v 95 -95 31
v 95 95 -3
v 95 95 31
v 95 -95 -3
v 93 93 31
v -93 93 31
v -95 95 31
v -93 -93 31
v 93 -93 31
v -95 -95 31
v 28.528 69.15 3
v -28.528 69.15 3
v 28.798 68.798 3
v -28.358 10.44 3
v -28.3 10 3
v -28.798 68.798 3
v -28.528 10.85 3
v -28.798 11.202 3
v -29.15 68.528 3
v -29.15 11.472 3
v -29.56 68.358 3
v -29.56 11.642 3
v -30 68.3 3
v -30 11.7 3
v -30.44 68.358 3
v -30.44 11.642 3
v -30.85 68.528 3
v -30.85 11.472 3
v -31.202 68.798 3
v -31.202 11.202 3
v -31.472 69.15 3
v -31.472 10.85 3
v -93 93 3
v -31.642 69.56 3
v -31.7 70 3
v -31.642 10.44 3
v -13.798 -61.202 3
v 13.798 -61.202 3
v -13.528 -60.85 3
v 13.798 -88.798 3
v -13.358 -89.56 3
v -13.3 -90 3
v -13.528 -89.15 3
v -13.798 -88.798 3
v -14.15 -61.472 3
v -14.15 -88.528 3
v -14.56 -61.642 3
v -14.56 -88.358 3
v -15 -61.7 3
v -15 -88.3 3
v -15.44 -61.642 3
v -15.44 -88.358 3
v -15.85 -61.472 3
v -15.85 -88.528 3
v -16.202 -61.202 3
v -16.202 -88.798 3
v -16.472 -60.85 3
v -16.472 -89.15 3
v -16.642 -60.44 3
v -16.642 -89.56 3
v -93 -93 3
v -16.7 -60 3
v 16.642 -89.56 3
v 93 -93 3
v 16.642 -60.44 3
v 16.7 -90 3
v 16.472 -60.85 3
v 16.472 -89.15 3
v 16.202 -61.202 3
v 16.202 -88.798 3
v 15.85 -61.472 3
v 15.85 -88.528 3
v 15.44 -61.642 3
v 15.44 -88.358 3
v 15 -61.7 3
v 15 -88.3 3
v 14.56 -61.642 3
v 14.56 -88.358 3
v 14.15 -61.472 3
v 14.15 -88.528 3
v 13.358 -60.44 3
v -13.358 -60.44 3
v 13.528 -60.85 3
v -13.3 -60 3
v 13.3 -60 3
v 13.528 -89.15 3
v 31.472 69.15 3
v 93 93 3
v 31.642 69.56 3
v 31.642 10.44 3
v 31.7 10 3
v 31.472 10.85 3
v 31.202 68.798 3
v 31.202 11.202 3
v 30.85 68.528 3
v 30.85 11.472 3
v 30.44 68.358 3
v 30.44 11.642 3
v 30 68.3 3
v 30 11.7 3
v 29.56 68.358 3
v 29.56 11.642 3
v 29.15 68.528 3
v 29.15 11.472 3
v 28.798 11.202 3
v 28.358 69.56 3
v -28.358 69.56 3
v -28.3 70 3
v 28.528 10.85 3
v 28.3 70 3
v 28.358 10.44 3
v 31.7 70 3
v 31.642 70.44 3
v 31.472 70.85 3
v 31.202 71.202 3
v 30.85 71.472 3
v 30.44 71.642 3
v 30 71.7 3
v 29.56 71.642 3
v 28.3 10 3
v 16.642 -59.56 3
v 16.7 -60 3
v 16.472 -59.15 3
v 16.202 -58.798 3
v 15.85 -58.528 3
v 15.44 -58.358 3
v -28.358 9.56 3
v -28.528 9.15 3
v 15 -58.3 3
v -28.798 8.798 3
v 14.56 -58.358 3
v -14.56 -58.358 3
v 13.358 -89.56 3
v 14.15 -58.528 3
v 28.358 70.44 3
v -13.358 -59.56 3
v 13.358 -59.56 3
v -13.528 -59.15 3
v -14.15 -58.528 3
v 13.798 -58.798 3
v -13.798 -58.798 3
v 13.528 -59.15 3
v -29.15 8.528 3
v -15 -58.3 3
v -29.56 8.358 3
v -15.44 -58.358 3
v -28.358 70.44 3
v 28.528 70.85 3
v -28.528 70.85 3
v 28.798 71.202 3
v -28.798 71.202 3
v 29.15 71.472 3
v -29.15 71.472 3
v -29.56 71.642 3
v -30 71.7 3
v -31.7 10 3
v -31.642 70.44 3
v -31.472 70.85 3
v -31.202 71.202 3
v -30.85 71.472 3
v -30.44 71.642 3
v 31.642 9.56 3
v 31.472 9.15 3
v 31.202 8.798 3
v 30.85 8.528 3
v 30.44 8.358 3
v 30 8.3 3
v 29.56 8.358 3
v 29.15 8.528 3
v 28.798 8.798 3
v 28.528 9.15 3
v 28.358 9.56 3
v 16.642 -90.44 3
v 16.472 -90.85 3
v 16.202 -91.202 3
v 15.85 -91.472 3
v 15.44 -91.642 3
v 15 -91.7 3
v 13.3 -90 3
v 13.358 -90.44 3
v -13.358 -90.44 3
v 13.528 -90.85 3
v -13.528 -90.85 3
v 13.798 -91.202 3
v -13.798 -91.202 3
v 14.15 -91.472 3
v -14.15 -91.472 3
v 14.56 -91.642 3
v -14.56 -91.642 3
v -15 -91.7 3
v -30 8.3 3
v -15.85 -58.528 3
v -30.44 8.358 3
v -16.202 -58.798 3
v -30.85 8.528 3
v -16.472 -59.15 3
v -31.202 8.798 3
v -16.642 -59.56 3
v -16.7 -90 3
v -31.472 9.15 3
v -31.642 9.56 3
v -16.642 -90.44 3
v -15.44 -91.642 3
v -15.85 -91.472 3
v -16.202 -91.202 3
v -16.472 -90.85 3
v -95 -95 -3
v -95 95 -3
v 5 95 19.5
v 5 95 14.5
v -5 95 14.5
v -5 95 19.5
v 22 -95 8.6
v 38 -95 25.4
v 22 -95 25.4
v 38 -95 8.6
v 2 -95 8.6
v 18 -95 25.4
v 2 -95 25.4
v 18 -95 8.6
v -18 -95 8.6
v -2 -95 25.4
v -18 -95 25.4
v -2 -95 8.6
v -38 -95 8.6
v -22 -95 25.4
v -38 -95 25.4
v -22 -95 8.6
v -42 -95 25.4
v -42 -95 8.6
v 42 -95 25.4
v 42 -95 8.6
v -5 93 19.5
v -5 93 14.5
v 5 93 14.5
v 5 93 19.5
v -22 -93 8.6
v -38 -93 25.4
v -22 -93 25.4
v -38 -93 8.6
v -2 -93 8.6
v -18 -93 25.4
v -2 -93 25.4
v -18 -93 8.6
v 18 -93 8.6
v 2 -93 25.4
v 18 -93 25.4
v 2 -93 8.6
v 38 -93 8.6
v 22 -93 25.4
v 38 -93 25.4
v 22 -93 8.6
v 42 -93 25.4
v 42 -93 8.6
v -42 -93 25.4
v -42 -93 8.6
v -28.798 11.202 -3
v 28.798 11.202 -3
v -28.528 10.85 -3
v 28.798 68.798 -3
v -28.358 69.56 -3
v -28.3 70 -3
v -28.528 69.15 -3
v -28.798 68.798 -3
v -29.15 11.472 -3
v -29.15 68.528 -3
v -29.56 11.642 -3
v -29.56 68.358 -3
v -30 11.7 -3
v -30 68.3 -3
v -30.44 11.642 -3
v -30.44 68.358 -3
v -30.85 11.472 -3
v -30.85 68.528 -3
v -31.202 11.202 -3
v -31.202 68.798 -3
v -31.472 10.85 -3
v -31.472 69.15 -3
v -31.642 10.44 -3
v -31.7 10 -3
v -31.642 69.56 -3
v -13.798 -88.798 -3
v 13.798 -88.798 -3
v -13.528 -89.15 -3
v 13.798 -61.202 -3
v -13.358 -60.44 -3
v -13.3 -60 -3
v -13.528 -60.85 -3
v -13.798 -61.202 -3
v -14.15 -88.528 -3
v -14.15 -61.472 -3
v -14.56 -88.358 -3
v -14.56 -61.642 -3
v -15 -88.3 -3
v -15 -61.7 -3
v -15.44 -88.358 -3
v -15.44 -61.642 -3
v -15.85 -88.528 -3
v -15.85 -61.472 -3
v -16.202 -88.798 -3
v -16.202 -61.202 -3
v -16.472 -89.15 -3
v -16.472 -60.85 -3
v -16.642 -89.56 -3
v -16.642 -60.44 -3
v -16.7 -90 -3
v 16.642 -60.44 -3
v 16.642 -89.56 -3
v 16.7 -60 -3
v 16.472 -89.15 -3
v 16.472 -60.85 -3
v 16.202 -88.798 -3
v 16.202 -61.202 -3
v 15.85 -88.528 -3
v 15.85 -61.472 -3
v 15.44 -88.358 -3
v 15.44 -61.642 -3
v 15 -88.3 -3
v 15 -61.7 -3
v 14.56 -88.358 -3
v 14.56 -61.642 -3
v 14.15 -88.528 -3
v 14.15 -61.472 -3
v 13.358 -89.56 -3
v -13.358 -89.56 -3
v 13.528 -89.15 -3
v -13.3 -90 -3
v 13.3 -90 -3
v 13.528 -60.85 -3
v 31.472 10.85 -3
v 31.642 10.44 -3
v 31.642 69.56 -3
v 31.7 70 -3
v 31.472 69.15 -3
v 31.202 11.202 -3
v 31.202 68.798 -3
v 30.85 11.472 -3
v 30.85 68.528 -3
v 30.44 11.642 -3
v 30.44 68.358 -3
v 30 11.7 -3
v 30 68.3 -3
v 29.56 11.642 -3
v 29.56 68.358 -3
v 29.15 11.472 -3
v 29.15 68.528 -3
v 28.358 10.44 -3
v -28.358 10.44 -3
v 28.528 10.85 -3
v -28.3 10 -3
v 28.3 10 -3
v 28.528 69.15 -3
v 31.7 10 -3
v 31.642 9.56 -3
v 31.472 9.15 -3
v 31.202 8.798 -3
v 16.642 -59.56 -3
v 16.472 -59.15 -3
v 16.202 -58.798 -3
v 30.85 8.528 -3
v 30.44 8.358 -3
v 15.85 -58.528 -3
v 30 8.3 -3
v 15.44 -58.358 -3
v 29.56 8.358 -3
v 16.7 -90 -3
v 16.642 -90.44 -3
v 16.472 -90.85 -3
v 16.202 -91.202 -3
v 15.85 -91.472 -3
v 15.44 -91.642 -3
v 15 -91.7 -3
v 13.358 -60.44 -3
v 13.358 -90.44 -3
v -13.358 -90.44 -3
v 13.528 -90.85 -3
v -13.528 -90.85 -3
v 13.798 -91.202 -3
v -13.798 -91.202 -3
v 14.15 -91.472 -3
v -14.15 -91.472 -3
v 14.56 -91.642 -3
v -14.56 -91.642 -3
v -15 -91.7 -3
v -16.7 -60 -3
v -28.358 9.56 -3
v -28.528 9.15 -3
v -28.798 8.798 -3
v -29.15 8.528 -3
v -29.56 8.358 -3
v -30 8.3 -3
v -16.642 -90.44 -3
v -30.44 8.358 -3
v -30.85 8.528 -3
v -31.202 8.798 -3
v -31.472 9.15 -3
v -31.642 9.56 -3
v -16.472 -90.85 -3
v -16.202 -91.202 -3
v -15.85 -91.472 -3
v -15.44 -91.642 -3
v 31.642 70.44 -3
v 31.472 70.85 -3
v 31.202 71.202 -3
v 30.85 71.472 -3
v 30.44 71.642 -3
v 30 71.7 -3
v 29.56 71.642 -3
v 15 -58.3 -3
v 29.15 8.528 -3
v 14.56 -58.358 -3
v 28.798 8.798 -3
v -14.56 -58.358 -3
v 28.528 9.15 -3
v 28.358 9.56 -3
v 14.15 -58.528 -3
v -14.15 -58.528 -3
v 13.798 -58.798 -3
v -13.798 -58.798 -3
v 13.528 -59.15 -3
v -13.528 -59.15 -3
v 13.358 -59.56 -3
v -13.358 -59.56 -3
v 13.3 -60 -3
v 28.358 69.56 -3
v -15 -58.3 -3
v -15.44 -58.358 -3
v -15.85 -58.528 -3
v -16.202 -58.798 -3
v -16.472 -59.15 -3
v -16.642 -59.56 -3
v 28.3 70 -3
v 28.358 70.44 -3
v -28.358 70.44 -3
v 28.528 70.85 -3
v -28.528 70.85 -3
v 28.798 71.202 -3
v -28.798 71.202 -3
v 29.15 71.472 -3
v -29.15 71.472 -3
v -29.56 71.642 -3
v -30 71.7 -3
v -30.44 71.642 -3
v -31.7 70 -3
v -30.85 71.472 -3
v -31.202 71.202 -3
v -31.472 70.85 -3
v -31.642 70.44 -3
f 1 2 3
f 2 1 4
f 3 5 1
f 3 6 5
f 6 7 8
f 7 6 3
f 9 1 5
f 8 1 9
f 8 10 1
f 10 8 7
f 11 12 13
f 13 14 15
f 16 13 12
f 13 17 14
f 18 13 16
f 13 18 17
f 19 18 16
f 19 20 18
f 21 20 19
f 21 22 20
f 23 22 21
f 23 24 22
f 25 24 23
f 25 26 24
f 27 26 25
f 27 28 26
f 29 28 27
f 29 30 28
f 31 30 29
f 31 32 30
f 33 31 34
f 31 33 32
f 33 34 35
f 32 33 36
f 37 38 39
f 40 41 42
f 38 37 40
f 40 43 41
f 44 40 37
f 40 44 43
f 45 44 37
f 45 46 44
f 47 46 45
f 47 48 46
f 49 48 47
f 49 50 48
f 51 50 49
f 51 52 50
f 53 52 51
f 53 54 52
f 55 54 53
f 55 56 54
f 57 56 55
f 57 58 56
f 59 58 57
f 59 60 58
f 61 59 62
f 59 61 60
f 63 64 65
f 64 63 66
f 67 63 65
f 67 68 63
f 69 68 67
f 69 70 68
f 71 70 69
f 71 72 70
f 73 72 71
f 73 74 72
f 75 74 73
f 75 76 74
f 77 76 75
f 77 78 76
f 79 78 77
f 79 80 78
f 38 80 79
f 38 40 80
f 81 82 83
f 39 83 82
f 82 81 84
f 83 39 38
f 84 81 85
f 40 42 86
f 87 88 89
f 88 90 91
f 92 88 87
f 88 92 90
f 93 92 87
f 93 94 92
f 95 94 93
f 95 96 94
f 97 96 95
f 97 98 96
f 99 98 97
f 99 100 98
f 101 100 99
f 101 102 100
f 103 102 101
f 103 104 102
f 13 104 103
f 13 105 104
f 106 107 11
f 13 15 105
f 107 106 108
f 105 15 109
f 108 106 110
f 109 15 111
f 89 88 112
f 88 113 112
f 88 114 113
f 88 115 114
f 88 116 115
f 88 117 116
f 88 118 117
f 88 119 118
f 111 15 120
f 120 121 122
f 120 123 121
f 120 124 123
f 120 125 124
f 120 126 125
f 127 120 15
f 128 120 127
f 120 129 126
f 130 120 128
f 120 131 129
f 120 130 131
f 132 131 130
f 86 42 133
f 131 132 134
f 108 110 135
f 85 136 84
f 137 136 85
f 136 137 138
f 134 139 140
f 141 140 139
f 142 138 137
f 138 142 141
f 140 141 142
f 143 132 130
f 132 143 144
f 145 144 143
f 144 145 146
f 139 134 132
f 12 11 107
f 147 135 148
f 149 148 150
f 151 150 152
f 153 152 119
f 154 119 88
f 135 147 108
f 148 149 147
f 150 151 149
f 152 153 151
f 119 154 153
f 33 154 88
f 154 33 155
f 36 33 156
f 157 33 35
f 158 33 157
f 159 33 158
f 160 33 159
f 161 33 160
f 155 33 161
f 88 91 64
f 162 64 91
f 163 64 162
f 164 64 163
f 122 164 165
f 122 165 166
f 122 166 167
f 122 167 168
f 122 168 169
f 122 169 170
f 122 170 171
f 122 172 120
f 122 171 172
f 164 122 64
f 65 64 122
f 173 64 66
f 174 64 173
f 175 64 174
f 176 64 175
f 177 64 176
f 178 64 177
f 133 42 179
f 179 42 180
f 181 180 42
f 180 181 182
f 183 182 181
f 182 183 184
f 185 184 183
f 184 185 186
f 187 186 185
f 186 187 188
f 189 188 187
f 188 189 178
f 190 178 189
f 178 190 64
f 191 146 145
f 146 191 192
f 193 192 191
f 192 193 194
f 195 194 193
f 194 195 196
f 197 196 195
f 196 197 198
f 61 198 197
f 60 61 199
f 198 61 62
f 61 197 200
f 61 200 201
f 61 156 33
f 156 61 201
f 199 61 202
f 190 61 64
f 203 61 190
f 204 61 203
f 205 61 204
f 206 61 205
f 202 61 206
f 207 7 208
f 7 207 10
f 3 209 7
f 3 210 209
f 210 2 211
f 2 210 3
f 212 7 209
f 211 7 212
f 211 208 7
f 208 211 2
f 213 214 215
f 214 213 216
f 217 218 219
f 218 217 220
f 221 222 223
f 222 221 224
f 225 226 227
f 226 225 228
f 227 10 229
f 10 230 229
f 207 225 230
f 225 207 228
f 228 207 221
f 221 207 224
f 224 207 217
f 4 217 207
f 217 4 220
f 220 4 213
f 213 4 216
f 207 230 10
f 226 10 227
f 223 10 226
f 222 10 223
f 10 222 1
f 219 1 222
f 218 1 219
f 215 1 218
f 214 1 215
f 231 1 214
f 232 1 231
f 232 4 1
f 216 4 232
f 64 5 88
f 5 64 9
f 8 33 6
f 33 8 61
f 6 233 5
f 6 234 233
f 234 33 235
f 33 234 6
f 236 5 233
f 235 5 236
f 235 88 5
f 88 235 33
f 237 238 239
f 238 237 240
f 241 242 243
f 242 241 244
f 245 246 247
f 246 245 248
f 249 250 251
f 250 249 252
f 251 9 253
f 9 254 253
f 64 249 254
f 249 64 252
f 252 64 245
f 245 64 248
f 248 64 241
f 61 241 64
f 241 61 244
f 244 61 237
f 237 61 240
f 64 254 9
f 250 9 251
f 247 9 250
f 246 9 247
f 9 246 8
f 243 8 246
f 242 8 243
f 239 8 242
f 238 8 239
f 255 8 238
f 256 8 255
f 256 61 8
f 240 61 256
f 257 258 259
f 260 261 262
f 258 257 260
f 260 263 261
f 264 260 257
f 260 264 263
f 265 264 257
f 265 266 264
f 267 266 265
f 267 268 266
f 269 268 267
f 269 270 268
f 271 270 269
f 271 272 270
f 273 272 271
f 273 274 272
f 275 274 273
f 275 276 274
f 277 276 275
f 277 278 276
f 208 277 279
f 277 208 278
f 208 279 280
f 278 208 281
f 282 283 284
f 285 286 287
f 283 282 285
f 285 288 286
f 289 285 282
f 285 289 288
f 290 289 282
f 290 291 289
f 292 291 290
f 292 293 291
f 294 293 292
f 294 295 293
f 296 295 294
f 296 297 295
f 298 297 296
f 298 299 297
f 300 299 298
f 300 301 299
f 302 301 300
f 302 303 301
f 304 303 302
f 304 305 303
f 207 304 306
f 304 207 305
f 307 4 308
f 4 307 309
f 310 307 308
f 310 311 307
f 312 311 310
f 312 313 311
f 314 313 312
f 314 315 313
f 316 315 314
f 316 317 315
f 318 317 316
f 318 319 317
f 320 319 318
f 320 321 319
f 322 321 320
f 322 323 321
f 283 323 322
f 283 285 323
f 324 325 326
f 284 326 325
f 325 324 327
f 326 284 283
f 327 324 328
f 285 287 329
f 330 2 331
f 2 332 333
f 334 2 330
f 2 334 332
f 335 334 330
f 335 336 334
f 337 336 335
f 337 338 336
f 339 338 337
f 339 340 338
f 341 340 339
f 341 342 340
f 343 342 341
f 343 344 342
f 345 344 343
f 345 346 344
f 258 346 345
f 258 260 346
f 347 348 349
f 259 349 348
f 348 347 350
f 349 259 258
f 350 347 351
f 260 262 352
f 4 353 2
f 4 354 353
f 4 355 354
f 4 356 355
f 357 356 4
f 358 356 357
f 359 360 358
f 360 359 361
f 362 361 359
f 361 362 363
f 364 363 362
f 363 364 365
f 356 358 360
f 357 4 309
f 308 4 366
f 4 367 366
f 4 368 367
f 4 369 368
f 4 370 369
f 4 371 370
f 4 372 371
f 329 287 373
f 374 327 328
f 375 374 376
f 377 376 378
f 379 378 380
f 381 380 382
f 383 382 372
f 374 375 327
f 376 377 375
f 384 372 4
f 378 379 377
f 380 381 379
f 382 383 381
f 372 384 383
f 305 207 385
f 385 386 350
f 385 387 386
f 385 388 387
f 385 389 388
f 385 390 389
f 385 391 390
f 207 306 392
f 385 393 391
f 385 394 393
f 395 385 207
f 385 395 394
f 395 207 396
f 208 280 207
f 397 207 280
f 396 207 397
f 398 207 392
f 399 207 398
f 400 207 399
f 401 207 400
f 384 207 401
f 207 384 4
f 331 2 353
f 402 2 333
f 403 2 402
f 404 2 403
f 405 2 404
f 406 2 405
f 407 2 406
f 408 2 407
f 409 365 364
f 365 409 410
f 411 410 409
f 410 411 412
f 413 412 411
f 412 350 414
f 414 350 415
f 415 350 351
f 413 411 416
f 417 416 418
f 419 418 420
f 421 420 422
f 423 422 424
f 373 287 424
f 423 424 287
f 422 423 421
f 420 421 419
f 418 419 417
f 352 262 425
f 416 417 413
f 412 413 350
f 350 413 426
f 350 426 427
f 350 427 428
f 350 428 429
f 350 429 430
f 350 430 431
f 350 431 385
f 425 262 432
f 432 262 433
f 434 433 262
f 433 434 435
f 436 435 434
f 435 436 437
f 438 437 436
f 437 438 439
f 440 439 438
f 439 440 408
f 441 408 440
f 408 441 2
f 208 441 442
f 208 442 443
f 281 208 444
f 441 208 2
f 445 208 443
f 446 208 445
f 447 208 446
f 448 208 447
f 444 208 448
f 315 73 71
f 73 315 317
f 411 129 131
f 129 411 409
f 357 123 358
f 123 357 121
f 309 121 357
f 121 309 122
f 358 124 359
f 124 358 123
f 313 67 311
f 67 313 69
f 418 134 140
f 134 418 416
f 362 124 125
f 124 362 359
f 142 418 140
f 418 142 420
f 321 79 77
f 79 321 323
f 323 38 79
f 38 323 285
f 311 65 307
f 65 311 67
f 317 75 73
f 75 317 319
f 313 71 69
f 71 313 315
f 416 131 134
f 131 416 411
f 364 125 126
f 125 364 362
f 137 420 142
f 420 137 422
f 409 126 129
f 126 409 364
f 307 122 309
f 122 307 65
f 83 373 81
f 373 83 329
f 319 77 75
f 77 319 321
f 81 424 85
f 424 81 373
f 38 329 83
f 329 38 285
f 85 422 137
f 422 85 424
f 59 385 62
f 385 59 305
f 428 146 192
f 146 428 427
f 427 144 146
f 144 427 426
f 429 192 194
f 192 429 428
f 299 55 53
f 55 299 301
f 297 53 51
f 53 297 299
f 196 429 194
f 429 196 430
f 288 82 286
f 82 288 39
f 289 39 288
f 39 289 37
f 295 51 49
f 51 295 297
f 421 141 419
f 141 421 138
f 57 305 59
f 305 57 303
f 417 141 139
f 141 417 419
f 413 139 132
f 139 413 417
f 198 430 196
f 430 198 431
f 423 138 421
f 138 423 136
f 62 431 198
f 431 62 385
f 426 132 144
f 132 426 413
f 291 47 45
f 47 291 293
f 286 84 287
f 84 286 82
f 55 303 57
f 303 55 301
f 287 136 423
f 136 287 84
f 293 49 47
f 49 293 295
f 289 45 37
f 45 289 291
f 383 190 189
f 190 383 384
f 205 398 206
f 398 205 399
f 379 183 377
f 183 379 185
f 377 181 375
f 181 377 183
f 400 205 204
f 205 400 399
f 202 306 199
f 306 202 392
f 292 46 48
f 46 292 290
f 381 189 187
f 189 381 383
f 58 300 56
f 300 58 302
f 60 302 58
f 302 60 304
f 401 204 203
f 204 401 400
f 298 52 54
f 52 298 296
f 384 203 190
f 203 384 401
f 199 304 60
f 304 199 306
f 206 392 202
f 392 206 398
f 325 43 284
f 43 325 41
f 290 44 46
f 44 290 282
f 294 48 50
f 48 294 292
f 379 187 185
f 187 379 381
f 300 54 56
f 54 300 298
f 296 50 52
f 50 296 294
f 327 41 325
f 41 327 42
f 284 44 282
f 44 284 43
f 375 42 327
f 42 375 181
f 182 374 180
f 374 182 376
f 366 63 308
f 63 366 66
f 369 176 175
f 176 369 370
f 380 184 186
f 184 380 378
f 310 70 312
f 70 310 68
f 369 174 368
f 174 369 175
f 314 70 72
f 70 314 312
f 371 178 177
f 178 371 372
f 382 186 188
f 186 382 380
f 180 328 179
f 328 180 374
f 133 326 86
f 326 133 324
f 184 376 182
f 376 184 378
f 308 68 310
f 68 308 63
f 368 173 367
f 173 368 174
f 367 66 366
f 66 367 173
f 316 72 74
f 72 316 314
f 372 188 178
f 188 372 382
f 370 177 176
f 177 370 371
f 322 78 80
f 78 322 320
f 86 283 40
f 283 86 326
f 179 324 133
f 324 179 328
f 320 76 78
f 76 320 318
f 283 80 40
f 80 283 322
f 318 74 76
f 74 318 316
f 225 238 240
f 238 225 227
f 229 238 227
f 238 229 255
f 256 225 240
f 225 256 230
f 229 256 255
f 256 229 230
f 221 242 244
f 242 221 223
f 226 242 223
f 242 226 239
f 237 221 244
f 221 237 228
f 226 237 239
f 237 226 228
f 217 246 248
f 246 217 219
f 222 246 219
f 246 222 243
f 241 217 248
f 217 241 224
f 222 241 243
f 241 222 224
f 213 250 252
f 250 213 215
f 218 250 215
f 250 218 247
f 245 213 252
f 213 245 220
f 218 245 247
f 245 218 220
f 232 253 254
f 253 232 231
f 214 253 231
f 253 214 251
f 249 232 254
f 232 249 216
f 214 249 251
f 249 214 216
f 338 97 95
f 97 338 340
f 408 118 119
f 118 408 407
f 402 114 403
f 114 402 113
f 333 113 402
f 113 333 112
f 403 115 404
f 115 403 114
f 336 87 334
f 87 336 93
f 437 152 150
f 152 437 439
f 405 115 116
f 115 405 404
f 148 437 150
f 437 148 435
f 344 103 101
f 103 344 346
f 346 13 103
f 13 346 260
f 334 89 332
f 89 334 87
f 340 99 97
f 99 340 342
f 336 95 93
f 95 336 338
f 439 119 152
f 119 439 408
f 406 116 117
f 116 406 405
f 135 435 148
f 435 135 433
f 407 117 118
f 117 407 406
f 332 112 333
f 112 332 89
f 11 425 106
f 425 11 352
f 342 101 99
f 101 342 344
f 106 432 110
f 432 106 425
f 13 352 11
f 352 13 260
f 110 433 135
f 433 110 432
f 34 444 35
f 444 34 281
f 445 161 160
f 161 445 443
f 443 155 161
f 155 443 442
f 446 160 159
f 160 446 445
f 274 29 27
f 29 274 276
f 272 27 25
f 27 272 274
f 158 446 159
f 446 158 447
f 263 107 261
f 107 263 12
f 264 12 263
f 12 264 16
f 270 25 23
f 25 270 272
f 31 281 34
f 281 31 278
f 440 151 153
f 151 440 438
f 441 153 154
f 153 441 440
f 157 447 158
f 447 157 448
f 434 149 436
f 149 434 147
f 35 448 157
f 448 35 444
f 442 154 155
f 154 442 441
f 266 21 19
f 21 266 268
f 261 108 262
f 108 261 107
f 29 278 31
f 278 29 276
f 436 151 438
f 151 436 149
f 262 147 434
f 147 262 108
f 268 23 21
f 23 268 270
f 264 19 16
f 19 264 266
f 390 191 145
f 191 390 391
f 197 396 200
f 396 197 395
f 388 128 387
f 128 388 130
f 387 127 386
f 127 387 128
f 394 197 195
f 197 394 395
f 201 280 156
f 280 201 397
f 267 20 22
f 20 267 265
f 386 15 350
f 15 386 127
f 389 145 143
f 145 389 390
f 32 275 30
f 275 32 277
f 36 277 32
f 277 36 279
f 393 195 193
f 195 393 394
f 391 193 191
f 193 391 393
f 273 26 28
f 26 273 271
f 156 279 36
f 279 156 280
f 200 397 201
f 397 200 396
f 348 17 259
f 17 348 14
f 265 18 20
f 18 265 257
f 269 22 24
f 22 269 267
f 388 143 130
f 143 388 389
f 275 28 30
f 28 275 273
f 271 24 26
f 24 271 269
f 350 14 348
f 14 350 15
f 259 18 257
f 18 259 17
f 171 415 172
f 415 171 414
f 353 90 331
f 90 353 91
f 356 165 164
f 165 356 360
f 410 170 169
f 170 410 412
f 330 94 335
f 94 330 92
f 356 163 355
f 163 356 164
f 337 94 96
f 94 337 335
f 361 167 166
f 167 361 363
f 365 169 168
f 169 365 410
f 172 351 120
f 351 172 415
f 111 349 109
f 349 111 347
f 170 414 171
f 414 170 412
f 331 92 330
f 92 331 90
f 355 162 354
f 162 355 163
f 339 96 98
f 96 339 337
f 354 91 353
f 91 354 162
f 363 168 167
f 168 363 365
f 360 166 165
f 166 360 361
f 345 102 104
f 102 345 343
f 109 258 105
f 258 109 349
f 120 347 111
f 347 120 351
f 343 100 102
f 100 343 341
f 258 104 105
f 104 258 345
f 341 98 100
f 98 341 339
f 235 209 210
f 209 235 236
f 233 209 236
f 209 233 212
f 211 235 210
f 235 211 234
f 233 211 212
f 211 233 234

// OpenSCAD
// file: common.scad
// common.scad — every dimension in the feeder lives here.
// Change a value, re-run ../check.sh, and every part regrows together.

/* ---------- Printer envelope ---------- */
bed_x = 220;
bed_y = 220;
bed_z = 250;

/* ---------- Material and process ---------- */
wall      = 2.0;    // nominal wall thickness (5 perimeters at 0.4 nozzle)
fit_slide = 0.30;   // clearance for parts that must move against each other
fit_press = 0.15;   // clearance for parts pressed together
$fn       = 96;

/* ---------- Fasteners ---------- */
m3_free = 3.4;      // M3 clearance hole
m3_tap  = 2.8;      // M3 self-tapping into plastic
m4_free = 4.5;

/* ---------- Load cells (VERIFY against the cells you actually buy) ----------
   Figures below are for the common YZC-133 straight bar. Bolt spacing varies
   between suppliers; measure yours before printing the base or the platform. */
cell_l            = 80;
cell_w            = 12.7;
cell_h            = 12.7;
cell_bolt_spacing = 15;   // centre-to-centre, at each end
cell_gap          = 3;    // spacer thickness — the beam MUST be free to flex

/* ---------- Food model ---------- */
kibble_density = 0.40;   // g/cm^3, dry kibble bulk density

/* ---------- Hopper ---------- */
hopper_volume_l = 2.0;
hopper_mouth    = 140;   // inner, square, at the top
hopper_throat   = 55;    // inner, square, at the bottom

// Square frustum volume: V = h/3 * (A1 + A2 + sqrt(A1*A2))
// For squares sqrt(A1*A2) collapses to mouth*throat, so height is exact:
hopper_h = 3 * hopper_volume_l * 1000000 /
           (hopper_mouth*hopper_mouth + hopper_throat*hopper_throat +
            hopper_mouth*hopper_throat);

hopper_run        = (hopper_mouth - hopper_throat) / 2;
hopper_wall_angle = atan(hopper_h / hopper_run);   // from horizontal
hopper_taper_rate = (hopper_mouth - hopper_throat) / hopper_h;
hopper_capacity_g = hopper_volume_l * 1000 * kibble_density;

/* ---------- Drum valve ---------- */
drum_dia       = 50;
drum_len       = 60;
drum_clearance = 0.4;                      // radial
drum_bore      = drum_dia + 2*drum_clearance;
pocket_depth   = 11.3;                     // segment depth of the scoop
shaft_dia      = 6;
shaft_len      = 8;

// Circular-segment maths. OpenSCAD trig is in DEGREES; the segment area
// formula needs the angle in RADIANS, hence the two forms below.
drum_r          = drum_dia / 2;
pocket_theta    = 2 * acos(1 - pocket_depth/drum_r);        // degrees
pocket_theta_r  = pocket_theta * PI / 180;                  // radians
pocket_area     = drum_r*drum_r/2 * (pocket_theta_r - sin(pocket_theta));
pocket_volume   = pocket_area * drum_len;                   // mm^3
sweep_grams     = pocket_volume / 1000 * kibble_density;    // DERIVED, not assumed

/* ---------- Valve housing ---------- */
housing_x = drum_len + 4*wall;      // along the drum axis
housing_y = drum_bore + 4*wall;
housing_z = drum_bore + 4*wall;
outlet_x  = 45;
outlet_y  = 45;

/* ---------- Chute ---------- */
chute_forward = 70;    // how far forward of the tower the food lands
chute_drop    = 90;    // vertical fall from valve outlet to chute exit
chute_exit    = 40;
chute_clear   = 40;    // exit height above the bowl rim — impulse, not load

/* ---------- Bowl and platform ---------- */
bowl_dia     = 140;    // the BOUGHT stainless/ceramic bowl
platform_dia = 150;
platform_t   = 5;
ring_w       = 3;
ring_h       = 8;
bowl_gap     = 6;      // air on every side — the isolation gap

/* ---------- Base and tower ---------- */
base_size = 190;
base_t    = 6;
bay_h     = 28;        // electronics bay height
tower_w   = 90;
tower_d   = 70;
tower_h   = 150;

/* ---------- Head ---------- */
head_tilt   = 30;      // camera, degrees down from horizontal
cam_pcb     = [40, 40, 1.6];
sr04_dia    = 16;
sr04_pitch  = 26;      // centre-to-centre of the two transducers

/* ---------- Derived overall ---------- */
total_h = base_t + bay_h + tower_h + housing_z + hopper_h;

/* ---------- Assertions: the things that silently ruin a print ---------- */
assert(hopper_wall_angle >= 60,
       str("Hopper wall ", hopper_wall_angle, " deg is below 60 - kibble will bridge"));
assert(hopper_h + 2*wall <= bed_z,
       str("Hopper ", hopper_h, " mm exceeds bed Z ", bed_z));
assert(hopper_mouth + 2*wall <= bed_x,
       "Hopper mouth exceeds bed X");
assert(base_size <= bed_x && base_size <= bed_y,
       "Base exceeds bed footprint");
assert(platform_dia <= bed_x, "Bowl platform exceeds bed X");
assert(drum_clearance > 0, "Drum clearance must be positive or the drum seizes");
assert(drum_bore > drum_dia, "Drum bore must exceed drum diameter");
assert(pocket_depth < drum_r,
       "Pocket deeper than the drum radius - the scoop would cut through the axis");
assert(sweep_grams > 6 && sweep_grams < 10,
       str("Sweep delivers ", sweep_grams, " g - outside the 6-10 g design window"));
assert(bowl_gap > 0, "Bowl isolation gap must be positive");
assert(cell_gap > 0, "Load cell needs a flex gap or it reads nothing");
assert(chute_forward + 40 <= bed_y,
       "Bowl arm exceeds bed Y - split it or shorten chute_forward");

/* ---------- Shared geometry ---------- */
// A square frustum, bottom face on the XY plane, centred on Z.
module frustum(bottom, top, h) {
  linear_extrude(height = h, scale = top/bottom)
    square([bottom, bottom], center = true);
}

// A rectangular tube used for the labyrinth lip on the lid and hopper mouth.
module lip(inner, thickness, h) {
  difference() {
    cube([inner + 2*thickness, inner + 2*thickness, h], center = true);
    cube([inner, inner, h + 1], center = true);
  }
}

// Four bolt holes on a square pattern.
module bolt_square(spacing, dia, h) {
  for (i = [0:3])
    rotate([0, 0, 90*i])
      translate([spacing/2, spacing/2, 0])
        cylinder(d = dia, h = h, center = true, $fn = 24);
}

// The cantilever footprint a load cell bolts into: two holes plus a relief slot.
module cell_mount(dia = m3_tap, h = 10) {
  for (y = [-cell_bolt_spacing/2, cell_bolt_spacing/2])
    translate([0, y, 0]) cylinder(d = dia, h = h, center = true, $fn = 24);
}

echo(str("hopper_h = ", hopper_h, " mm"));
echo(str("hopper wall angle = ", hopper_wall_angle, " deg"));
echo(str("hopper capacity = ", hopper_capacity_g, " g"));
echo(str("sweep = ", sweep_grams, " g"));
echo(str("total height = ", total_h, " mm"));
// main file
include <common.scad>

usb_w = 10;
usb_h = 5;

module base() {
  difference() {
    union() {
      // Main plate.
      cube([base_size, base_size, base_t], center = true);
      // Electronics bay walls.
      translate([0, 0, base_t/2 + bay_h/2])
        difference() {
          cube([base_size, base_size, bay_h], center = true);
          cube([base_size - 2*wall, base_size - 2*wall, bay_h + 1], center = true);
        }
    }

    // Bowl arm lap bolts — the arm prints separately, see bowl-arm.scad.
    translate([0, -base_size/2 + 20, 0]) bolt_square(30, m3_free, base_t + 2);

    // USB-C panel cutout in the rear bay wall.
    translate([0, base_size/2 - wall/2, base_t/2 + bay_h/2])
      cube([usb_w, wall + 2, usb_h], center = true);

    // Ventilation for the bay.
    for (x = [-40:20:40])
      translate([x, -base_size/2 + wall/2, base_t/2 + bay_h/2])
        cube([4, wall + 2, bay_h * 0.6], center = true);

    // Tower mounting holes.
    translate([0, 40, 0]) bolt_square(60, m3_free, base_t + 2);
  }
}

base();
